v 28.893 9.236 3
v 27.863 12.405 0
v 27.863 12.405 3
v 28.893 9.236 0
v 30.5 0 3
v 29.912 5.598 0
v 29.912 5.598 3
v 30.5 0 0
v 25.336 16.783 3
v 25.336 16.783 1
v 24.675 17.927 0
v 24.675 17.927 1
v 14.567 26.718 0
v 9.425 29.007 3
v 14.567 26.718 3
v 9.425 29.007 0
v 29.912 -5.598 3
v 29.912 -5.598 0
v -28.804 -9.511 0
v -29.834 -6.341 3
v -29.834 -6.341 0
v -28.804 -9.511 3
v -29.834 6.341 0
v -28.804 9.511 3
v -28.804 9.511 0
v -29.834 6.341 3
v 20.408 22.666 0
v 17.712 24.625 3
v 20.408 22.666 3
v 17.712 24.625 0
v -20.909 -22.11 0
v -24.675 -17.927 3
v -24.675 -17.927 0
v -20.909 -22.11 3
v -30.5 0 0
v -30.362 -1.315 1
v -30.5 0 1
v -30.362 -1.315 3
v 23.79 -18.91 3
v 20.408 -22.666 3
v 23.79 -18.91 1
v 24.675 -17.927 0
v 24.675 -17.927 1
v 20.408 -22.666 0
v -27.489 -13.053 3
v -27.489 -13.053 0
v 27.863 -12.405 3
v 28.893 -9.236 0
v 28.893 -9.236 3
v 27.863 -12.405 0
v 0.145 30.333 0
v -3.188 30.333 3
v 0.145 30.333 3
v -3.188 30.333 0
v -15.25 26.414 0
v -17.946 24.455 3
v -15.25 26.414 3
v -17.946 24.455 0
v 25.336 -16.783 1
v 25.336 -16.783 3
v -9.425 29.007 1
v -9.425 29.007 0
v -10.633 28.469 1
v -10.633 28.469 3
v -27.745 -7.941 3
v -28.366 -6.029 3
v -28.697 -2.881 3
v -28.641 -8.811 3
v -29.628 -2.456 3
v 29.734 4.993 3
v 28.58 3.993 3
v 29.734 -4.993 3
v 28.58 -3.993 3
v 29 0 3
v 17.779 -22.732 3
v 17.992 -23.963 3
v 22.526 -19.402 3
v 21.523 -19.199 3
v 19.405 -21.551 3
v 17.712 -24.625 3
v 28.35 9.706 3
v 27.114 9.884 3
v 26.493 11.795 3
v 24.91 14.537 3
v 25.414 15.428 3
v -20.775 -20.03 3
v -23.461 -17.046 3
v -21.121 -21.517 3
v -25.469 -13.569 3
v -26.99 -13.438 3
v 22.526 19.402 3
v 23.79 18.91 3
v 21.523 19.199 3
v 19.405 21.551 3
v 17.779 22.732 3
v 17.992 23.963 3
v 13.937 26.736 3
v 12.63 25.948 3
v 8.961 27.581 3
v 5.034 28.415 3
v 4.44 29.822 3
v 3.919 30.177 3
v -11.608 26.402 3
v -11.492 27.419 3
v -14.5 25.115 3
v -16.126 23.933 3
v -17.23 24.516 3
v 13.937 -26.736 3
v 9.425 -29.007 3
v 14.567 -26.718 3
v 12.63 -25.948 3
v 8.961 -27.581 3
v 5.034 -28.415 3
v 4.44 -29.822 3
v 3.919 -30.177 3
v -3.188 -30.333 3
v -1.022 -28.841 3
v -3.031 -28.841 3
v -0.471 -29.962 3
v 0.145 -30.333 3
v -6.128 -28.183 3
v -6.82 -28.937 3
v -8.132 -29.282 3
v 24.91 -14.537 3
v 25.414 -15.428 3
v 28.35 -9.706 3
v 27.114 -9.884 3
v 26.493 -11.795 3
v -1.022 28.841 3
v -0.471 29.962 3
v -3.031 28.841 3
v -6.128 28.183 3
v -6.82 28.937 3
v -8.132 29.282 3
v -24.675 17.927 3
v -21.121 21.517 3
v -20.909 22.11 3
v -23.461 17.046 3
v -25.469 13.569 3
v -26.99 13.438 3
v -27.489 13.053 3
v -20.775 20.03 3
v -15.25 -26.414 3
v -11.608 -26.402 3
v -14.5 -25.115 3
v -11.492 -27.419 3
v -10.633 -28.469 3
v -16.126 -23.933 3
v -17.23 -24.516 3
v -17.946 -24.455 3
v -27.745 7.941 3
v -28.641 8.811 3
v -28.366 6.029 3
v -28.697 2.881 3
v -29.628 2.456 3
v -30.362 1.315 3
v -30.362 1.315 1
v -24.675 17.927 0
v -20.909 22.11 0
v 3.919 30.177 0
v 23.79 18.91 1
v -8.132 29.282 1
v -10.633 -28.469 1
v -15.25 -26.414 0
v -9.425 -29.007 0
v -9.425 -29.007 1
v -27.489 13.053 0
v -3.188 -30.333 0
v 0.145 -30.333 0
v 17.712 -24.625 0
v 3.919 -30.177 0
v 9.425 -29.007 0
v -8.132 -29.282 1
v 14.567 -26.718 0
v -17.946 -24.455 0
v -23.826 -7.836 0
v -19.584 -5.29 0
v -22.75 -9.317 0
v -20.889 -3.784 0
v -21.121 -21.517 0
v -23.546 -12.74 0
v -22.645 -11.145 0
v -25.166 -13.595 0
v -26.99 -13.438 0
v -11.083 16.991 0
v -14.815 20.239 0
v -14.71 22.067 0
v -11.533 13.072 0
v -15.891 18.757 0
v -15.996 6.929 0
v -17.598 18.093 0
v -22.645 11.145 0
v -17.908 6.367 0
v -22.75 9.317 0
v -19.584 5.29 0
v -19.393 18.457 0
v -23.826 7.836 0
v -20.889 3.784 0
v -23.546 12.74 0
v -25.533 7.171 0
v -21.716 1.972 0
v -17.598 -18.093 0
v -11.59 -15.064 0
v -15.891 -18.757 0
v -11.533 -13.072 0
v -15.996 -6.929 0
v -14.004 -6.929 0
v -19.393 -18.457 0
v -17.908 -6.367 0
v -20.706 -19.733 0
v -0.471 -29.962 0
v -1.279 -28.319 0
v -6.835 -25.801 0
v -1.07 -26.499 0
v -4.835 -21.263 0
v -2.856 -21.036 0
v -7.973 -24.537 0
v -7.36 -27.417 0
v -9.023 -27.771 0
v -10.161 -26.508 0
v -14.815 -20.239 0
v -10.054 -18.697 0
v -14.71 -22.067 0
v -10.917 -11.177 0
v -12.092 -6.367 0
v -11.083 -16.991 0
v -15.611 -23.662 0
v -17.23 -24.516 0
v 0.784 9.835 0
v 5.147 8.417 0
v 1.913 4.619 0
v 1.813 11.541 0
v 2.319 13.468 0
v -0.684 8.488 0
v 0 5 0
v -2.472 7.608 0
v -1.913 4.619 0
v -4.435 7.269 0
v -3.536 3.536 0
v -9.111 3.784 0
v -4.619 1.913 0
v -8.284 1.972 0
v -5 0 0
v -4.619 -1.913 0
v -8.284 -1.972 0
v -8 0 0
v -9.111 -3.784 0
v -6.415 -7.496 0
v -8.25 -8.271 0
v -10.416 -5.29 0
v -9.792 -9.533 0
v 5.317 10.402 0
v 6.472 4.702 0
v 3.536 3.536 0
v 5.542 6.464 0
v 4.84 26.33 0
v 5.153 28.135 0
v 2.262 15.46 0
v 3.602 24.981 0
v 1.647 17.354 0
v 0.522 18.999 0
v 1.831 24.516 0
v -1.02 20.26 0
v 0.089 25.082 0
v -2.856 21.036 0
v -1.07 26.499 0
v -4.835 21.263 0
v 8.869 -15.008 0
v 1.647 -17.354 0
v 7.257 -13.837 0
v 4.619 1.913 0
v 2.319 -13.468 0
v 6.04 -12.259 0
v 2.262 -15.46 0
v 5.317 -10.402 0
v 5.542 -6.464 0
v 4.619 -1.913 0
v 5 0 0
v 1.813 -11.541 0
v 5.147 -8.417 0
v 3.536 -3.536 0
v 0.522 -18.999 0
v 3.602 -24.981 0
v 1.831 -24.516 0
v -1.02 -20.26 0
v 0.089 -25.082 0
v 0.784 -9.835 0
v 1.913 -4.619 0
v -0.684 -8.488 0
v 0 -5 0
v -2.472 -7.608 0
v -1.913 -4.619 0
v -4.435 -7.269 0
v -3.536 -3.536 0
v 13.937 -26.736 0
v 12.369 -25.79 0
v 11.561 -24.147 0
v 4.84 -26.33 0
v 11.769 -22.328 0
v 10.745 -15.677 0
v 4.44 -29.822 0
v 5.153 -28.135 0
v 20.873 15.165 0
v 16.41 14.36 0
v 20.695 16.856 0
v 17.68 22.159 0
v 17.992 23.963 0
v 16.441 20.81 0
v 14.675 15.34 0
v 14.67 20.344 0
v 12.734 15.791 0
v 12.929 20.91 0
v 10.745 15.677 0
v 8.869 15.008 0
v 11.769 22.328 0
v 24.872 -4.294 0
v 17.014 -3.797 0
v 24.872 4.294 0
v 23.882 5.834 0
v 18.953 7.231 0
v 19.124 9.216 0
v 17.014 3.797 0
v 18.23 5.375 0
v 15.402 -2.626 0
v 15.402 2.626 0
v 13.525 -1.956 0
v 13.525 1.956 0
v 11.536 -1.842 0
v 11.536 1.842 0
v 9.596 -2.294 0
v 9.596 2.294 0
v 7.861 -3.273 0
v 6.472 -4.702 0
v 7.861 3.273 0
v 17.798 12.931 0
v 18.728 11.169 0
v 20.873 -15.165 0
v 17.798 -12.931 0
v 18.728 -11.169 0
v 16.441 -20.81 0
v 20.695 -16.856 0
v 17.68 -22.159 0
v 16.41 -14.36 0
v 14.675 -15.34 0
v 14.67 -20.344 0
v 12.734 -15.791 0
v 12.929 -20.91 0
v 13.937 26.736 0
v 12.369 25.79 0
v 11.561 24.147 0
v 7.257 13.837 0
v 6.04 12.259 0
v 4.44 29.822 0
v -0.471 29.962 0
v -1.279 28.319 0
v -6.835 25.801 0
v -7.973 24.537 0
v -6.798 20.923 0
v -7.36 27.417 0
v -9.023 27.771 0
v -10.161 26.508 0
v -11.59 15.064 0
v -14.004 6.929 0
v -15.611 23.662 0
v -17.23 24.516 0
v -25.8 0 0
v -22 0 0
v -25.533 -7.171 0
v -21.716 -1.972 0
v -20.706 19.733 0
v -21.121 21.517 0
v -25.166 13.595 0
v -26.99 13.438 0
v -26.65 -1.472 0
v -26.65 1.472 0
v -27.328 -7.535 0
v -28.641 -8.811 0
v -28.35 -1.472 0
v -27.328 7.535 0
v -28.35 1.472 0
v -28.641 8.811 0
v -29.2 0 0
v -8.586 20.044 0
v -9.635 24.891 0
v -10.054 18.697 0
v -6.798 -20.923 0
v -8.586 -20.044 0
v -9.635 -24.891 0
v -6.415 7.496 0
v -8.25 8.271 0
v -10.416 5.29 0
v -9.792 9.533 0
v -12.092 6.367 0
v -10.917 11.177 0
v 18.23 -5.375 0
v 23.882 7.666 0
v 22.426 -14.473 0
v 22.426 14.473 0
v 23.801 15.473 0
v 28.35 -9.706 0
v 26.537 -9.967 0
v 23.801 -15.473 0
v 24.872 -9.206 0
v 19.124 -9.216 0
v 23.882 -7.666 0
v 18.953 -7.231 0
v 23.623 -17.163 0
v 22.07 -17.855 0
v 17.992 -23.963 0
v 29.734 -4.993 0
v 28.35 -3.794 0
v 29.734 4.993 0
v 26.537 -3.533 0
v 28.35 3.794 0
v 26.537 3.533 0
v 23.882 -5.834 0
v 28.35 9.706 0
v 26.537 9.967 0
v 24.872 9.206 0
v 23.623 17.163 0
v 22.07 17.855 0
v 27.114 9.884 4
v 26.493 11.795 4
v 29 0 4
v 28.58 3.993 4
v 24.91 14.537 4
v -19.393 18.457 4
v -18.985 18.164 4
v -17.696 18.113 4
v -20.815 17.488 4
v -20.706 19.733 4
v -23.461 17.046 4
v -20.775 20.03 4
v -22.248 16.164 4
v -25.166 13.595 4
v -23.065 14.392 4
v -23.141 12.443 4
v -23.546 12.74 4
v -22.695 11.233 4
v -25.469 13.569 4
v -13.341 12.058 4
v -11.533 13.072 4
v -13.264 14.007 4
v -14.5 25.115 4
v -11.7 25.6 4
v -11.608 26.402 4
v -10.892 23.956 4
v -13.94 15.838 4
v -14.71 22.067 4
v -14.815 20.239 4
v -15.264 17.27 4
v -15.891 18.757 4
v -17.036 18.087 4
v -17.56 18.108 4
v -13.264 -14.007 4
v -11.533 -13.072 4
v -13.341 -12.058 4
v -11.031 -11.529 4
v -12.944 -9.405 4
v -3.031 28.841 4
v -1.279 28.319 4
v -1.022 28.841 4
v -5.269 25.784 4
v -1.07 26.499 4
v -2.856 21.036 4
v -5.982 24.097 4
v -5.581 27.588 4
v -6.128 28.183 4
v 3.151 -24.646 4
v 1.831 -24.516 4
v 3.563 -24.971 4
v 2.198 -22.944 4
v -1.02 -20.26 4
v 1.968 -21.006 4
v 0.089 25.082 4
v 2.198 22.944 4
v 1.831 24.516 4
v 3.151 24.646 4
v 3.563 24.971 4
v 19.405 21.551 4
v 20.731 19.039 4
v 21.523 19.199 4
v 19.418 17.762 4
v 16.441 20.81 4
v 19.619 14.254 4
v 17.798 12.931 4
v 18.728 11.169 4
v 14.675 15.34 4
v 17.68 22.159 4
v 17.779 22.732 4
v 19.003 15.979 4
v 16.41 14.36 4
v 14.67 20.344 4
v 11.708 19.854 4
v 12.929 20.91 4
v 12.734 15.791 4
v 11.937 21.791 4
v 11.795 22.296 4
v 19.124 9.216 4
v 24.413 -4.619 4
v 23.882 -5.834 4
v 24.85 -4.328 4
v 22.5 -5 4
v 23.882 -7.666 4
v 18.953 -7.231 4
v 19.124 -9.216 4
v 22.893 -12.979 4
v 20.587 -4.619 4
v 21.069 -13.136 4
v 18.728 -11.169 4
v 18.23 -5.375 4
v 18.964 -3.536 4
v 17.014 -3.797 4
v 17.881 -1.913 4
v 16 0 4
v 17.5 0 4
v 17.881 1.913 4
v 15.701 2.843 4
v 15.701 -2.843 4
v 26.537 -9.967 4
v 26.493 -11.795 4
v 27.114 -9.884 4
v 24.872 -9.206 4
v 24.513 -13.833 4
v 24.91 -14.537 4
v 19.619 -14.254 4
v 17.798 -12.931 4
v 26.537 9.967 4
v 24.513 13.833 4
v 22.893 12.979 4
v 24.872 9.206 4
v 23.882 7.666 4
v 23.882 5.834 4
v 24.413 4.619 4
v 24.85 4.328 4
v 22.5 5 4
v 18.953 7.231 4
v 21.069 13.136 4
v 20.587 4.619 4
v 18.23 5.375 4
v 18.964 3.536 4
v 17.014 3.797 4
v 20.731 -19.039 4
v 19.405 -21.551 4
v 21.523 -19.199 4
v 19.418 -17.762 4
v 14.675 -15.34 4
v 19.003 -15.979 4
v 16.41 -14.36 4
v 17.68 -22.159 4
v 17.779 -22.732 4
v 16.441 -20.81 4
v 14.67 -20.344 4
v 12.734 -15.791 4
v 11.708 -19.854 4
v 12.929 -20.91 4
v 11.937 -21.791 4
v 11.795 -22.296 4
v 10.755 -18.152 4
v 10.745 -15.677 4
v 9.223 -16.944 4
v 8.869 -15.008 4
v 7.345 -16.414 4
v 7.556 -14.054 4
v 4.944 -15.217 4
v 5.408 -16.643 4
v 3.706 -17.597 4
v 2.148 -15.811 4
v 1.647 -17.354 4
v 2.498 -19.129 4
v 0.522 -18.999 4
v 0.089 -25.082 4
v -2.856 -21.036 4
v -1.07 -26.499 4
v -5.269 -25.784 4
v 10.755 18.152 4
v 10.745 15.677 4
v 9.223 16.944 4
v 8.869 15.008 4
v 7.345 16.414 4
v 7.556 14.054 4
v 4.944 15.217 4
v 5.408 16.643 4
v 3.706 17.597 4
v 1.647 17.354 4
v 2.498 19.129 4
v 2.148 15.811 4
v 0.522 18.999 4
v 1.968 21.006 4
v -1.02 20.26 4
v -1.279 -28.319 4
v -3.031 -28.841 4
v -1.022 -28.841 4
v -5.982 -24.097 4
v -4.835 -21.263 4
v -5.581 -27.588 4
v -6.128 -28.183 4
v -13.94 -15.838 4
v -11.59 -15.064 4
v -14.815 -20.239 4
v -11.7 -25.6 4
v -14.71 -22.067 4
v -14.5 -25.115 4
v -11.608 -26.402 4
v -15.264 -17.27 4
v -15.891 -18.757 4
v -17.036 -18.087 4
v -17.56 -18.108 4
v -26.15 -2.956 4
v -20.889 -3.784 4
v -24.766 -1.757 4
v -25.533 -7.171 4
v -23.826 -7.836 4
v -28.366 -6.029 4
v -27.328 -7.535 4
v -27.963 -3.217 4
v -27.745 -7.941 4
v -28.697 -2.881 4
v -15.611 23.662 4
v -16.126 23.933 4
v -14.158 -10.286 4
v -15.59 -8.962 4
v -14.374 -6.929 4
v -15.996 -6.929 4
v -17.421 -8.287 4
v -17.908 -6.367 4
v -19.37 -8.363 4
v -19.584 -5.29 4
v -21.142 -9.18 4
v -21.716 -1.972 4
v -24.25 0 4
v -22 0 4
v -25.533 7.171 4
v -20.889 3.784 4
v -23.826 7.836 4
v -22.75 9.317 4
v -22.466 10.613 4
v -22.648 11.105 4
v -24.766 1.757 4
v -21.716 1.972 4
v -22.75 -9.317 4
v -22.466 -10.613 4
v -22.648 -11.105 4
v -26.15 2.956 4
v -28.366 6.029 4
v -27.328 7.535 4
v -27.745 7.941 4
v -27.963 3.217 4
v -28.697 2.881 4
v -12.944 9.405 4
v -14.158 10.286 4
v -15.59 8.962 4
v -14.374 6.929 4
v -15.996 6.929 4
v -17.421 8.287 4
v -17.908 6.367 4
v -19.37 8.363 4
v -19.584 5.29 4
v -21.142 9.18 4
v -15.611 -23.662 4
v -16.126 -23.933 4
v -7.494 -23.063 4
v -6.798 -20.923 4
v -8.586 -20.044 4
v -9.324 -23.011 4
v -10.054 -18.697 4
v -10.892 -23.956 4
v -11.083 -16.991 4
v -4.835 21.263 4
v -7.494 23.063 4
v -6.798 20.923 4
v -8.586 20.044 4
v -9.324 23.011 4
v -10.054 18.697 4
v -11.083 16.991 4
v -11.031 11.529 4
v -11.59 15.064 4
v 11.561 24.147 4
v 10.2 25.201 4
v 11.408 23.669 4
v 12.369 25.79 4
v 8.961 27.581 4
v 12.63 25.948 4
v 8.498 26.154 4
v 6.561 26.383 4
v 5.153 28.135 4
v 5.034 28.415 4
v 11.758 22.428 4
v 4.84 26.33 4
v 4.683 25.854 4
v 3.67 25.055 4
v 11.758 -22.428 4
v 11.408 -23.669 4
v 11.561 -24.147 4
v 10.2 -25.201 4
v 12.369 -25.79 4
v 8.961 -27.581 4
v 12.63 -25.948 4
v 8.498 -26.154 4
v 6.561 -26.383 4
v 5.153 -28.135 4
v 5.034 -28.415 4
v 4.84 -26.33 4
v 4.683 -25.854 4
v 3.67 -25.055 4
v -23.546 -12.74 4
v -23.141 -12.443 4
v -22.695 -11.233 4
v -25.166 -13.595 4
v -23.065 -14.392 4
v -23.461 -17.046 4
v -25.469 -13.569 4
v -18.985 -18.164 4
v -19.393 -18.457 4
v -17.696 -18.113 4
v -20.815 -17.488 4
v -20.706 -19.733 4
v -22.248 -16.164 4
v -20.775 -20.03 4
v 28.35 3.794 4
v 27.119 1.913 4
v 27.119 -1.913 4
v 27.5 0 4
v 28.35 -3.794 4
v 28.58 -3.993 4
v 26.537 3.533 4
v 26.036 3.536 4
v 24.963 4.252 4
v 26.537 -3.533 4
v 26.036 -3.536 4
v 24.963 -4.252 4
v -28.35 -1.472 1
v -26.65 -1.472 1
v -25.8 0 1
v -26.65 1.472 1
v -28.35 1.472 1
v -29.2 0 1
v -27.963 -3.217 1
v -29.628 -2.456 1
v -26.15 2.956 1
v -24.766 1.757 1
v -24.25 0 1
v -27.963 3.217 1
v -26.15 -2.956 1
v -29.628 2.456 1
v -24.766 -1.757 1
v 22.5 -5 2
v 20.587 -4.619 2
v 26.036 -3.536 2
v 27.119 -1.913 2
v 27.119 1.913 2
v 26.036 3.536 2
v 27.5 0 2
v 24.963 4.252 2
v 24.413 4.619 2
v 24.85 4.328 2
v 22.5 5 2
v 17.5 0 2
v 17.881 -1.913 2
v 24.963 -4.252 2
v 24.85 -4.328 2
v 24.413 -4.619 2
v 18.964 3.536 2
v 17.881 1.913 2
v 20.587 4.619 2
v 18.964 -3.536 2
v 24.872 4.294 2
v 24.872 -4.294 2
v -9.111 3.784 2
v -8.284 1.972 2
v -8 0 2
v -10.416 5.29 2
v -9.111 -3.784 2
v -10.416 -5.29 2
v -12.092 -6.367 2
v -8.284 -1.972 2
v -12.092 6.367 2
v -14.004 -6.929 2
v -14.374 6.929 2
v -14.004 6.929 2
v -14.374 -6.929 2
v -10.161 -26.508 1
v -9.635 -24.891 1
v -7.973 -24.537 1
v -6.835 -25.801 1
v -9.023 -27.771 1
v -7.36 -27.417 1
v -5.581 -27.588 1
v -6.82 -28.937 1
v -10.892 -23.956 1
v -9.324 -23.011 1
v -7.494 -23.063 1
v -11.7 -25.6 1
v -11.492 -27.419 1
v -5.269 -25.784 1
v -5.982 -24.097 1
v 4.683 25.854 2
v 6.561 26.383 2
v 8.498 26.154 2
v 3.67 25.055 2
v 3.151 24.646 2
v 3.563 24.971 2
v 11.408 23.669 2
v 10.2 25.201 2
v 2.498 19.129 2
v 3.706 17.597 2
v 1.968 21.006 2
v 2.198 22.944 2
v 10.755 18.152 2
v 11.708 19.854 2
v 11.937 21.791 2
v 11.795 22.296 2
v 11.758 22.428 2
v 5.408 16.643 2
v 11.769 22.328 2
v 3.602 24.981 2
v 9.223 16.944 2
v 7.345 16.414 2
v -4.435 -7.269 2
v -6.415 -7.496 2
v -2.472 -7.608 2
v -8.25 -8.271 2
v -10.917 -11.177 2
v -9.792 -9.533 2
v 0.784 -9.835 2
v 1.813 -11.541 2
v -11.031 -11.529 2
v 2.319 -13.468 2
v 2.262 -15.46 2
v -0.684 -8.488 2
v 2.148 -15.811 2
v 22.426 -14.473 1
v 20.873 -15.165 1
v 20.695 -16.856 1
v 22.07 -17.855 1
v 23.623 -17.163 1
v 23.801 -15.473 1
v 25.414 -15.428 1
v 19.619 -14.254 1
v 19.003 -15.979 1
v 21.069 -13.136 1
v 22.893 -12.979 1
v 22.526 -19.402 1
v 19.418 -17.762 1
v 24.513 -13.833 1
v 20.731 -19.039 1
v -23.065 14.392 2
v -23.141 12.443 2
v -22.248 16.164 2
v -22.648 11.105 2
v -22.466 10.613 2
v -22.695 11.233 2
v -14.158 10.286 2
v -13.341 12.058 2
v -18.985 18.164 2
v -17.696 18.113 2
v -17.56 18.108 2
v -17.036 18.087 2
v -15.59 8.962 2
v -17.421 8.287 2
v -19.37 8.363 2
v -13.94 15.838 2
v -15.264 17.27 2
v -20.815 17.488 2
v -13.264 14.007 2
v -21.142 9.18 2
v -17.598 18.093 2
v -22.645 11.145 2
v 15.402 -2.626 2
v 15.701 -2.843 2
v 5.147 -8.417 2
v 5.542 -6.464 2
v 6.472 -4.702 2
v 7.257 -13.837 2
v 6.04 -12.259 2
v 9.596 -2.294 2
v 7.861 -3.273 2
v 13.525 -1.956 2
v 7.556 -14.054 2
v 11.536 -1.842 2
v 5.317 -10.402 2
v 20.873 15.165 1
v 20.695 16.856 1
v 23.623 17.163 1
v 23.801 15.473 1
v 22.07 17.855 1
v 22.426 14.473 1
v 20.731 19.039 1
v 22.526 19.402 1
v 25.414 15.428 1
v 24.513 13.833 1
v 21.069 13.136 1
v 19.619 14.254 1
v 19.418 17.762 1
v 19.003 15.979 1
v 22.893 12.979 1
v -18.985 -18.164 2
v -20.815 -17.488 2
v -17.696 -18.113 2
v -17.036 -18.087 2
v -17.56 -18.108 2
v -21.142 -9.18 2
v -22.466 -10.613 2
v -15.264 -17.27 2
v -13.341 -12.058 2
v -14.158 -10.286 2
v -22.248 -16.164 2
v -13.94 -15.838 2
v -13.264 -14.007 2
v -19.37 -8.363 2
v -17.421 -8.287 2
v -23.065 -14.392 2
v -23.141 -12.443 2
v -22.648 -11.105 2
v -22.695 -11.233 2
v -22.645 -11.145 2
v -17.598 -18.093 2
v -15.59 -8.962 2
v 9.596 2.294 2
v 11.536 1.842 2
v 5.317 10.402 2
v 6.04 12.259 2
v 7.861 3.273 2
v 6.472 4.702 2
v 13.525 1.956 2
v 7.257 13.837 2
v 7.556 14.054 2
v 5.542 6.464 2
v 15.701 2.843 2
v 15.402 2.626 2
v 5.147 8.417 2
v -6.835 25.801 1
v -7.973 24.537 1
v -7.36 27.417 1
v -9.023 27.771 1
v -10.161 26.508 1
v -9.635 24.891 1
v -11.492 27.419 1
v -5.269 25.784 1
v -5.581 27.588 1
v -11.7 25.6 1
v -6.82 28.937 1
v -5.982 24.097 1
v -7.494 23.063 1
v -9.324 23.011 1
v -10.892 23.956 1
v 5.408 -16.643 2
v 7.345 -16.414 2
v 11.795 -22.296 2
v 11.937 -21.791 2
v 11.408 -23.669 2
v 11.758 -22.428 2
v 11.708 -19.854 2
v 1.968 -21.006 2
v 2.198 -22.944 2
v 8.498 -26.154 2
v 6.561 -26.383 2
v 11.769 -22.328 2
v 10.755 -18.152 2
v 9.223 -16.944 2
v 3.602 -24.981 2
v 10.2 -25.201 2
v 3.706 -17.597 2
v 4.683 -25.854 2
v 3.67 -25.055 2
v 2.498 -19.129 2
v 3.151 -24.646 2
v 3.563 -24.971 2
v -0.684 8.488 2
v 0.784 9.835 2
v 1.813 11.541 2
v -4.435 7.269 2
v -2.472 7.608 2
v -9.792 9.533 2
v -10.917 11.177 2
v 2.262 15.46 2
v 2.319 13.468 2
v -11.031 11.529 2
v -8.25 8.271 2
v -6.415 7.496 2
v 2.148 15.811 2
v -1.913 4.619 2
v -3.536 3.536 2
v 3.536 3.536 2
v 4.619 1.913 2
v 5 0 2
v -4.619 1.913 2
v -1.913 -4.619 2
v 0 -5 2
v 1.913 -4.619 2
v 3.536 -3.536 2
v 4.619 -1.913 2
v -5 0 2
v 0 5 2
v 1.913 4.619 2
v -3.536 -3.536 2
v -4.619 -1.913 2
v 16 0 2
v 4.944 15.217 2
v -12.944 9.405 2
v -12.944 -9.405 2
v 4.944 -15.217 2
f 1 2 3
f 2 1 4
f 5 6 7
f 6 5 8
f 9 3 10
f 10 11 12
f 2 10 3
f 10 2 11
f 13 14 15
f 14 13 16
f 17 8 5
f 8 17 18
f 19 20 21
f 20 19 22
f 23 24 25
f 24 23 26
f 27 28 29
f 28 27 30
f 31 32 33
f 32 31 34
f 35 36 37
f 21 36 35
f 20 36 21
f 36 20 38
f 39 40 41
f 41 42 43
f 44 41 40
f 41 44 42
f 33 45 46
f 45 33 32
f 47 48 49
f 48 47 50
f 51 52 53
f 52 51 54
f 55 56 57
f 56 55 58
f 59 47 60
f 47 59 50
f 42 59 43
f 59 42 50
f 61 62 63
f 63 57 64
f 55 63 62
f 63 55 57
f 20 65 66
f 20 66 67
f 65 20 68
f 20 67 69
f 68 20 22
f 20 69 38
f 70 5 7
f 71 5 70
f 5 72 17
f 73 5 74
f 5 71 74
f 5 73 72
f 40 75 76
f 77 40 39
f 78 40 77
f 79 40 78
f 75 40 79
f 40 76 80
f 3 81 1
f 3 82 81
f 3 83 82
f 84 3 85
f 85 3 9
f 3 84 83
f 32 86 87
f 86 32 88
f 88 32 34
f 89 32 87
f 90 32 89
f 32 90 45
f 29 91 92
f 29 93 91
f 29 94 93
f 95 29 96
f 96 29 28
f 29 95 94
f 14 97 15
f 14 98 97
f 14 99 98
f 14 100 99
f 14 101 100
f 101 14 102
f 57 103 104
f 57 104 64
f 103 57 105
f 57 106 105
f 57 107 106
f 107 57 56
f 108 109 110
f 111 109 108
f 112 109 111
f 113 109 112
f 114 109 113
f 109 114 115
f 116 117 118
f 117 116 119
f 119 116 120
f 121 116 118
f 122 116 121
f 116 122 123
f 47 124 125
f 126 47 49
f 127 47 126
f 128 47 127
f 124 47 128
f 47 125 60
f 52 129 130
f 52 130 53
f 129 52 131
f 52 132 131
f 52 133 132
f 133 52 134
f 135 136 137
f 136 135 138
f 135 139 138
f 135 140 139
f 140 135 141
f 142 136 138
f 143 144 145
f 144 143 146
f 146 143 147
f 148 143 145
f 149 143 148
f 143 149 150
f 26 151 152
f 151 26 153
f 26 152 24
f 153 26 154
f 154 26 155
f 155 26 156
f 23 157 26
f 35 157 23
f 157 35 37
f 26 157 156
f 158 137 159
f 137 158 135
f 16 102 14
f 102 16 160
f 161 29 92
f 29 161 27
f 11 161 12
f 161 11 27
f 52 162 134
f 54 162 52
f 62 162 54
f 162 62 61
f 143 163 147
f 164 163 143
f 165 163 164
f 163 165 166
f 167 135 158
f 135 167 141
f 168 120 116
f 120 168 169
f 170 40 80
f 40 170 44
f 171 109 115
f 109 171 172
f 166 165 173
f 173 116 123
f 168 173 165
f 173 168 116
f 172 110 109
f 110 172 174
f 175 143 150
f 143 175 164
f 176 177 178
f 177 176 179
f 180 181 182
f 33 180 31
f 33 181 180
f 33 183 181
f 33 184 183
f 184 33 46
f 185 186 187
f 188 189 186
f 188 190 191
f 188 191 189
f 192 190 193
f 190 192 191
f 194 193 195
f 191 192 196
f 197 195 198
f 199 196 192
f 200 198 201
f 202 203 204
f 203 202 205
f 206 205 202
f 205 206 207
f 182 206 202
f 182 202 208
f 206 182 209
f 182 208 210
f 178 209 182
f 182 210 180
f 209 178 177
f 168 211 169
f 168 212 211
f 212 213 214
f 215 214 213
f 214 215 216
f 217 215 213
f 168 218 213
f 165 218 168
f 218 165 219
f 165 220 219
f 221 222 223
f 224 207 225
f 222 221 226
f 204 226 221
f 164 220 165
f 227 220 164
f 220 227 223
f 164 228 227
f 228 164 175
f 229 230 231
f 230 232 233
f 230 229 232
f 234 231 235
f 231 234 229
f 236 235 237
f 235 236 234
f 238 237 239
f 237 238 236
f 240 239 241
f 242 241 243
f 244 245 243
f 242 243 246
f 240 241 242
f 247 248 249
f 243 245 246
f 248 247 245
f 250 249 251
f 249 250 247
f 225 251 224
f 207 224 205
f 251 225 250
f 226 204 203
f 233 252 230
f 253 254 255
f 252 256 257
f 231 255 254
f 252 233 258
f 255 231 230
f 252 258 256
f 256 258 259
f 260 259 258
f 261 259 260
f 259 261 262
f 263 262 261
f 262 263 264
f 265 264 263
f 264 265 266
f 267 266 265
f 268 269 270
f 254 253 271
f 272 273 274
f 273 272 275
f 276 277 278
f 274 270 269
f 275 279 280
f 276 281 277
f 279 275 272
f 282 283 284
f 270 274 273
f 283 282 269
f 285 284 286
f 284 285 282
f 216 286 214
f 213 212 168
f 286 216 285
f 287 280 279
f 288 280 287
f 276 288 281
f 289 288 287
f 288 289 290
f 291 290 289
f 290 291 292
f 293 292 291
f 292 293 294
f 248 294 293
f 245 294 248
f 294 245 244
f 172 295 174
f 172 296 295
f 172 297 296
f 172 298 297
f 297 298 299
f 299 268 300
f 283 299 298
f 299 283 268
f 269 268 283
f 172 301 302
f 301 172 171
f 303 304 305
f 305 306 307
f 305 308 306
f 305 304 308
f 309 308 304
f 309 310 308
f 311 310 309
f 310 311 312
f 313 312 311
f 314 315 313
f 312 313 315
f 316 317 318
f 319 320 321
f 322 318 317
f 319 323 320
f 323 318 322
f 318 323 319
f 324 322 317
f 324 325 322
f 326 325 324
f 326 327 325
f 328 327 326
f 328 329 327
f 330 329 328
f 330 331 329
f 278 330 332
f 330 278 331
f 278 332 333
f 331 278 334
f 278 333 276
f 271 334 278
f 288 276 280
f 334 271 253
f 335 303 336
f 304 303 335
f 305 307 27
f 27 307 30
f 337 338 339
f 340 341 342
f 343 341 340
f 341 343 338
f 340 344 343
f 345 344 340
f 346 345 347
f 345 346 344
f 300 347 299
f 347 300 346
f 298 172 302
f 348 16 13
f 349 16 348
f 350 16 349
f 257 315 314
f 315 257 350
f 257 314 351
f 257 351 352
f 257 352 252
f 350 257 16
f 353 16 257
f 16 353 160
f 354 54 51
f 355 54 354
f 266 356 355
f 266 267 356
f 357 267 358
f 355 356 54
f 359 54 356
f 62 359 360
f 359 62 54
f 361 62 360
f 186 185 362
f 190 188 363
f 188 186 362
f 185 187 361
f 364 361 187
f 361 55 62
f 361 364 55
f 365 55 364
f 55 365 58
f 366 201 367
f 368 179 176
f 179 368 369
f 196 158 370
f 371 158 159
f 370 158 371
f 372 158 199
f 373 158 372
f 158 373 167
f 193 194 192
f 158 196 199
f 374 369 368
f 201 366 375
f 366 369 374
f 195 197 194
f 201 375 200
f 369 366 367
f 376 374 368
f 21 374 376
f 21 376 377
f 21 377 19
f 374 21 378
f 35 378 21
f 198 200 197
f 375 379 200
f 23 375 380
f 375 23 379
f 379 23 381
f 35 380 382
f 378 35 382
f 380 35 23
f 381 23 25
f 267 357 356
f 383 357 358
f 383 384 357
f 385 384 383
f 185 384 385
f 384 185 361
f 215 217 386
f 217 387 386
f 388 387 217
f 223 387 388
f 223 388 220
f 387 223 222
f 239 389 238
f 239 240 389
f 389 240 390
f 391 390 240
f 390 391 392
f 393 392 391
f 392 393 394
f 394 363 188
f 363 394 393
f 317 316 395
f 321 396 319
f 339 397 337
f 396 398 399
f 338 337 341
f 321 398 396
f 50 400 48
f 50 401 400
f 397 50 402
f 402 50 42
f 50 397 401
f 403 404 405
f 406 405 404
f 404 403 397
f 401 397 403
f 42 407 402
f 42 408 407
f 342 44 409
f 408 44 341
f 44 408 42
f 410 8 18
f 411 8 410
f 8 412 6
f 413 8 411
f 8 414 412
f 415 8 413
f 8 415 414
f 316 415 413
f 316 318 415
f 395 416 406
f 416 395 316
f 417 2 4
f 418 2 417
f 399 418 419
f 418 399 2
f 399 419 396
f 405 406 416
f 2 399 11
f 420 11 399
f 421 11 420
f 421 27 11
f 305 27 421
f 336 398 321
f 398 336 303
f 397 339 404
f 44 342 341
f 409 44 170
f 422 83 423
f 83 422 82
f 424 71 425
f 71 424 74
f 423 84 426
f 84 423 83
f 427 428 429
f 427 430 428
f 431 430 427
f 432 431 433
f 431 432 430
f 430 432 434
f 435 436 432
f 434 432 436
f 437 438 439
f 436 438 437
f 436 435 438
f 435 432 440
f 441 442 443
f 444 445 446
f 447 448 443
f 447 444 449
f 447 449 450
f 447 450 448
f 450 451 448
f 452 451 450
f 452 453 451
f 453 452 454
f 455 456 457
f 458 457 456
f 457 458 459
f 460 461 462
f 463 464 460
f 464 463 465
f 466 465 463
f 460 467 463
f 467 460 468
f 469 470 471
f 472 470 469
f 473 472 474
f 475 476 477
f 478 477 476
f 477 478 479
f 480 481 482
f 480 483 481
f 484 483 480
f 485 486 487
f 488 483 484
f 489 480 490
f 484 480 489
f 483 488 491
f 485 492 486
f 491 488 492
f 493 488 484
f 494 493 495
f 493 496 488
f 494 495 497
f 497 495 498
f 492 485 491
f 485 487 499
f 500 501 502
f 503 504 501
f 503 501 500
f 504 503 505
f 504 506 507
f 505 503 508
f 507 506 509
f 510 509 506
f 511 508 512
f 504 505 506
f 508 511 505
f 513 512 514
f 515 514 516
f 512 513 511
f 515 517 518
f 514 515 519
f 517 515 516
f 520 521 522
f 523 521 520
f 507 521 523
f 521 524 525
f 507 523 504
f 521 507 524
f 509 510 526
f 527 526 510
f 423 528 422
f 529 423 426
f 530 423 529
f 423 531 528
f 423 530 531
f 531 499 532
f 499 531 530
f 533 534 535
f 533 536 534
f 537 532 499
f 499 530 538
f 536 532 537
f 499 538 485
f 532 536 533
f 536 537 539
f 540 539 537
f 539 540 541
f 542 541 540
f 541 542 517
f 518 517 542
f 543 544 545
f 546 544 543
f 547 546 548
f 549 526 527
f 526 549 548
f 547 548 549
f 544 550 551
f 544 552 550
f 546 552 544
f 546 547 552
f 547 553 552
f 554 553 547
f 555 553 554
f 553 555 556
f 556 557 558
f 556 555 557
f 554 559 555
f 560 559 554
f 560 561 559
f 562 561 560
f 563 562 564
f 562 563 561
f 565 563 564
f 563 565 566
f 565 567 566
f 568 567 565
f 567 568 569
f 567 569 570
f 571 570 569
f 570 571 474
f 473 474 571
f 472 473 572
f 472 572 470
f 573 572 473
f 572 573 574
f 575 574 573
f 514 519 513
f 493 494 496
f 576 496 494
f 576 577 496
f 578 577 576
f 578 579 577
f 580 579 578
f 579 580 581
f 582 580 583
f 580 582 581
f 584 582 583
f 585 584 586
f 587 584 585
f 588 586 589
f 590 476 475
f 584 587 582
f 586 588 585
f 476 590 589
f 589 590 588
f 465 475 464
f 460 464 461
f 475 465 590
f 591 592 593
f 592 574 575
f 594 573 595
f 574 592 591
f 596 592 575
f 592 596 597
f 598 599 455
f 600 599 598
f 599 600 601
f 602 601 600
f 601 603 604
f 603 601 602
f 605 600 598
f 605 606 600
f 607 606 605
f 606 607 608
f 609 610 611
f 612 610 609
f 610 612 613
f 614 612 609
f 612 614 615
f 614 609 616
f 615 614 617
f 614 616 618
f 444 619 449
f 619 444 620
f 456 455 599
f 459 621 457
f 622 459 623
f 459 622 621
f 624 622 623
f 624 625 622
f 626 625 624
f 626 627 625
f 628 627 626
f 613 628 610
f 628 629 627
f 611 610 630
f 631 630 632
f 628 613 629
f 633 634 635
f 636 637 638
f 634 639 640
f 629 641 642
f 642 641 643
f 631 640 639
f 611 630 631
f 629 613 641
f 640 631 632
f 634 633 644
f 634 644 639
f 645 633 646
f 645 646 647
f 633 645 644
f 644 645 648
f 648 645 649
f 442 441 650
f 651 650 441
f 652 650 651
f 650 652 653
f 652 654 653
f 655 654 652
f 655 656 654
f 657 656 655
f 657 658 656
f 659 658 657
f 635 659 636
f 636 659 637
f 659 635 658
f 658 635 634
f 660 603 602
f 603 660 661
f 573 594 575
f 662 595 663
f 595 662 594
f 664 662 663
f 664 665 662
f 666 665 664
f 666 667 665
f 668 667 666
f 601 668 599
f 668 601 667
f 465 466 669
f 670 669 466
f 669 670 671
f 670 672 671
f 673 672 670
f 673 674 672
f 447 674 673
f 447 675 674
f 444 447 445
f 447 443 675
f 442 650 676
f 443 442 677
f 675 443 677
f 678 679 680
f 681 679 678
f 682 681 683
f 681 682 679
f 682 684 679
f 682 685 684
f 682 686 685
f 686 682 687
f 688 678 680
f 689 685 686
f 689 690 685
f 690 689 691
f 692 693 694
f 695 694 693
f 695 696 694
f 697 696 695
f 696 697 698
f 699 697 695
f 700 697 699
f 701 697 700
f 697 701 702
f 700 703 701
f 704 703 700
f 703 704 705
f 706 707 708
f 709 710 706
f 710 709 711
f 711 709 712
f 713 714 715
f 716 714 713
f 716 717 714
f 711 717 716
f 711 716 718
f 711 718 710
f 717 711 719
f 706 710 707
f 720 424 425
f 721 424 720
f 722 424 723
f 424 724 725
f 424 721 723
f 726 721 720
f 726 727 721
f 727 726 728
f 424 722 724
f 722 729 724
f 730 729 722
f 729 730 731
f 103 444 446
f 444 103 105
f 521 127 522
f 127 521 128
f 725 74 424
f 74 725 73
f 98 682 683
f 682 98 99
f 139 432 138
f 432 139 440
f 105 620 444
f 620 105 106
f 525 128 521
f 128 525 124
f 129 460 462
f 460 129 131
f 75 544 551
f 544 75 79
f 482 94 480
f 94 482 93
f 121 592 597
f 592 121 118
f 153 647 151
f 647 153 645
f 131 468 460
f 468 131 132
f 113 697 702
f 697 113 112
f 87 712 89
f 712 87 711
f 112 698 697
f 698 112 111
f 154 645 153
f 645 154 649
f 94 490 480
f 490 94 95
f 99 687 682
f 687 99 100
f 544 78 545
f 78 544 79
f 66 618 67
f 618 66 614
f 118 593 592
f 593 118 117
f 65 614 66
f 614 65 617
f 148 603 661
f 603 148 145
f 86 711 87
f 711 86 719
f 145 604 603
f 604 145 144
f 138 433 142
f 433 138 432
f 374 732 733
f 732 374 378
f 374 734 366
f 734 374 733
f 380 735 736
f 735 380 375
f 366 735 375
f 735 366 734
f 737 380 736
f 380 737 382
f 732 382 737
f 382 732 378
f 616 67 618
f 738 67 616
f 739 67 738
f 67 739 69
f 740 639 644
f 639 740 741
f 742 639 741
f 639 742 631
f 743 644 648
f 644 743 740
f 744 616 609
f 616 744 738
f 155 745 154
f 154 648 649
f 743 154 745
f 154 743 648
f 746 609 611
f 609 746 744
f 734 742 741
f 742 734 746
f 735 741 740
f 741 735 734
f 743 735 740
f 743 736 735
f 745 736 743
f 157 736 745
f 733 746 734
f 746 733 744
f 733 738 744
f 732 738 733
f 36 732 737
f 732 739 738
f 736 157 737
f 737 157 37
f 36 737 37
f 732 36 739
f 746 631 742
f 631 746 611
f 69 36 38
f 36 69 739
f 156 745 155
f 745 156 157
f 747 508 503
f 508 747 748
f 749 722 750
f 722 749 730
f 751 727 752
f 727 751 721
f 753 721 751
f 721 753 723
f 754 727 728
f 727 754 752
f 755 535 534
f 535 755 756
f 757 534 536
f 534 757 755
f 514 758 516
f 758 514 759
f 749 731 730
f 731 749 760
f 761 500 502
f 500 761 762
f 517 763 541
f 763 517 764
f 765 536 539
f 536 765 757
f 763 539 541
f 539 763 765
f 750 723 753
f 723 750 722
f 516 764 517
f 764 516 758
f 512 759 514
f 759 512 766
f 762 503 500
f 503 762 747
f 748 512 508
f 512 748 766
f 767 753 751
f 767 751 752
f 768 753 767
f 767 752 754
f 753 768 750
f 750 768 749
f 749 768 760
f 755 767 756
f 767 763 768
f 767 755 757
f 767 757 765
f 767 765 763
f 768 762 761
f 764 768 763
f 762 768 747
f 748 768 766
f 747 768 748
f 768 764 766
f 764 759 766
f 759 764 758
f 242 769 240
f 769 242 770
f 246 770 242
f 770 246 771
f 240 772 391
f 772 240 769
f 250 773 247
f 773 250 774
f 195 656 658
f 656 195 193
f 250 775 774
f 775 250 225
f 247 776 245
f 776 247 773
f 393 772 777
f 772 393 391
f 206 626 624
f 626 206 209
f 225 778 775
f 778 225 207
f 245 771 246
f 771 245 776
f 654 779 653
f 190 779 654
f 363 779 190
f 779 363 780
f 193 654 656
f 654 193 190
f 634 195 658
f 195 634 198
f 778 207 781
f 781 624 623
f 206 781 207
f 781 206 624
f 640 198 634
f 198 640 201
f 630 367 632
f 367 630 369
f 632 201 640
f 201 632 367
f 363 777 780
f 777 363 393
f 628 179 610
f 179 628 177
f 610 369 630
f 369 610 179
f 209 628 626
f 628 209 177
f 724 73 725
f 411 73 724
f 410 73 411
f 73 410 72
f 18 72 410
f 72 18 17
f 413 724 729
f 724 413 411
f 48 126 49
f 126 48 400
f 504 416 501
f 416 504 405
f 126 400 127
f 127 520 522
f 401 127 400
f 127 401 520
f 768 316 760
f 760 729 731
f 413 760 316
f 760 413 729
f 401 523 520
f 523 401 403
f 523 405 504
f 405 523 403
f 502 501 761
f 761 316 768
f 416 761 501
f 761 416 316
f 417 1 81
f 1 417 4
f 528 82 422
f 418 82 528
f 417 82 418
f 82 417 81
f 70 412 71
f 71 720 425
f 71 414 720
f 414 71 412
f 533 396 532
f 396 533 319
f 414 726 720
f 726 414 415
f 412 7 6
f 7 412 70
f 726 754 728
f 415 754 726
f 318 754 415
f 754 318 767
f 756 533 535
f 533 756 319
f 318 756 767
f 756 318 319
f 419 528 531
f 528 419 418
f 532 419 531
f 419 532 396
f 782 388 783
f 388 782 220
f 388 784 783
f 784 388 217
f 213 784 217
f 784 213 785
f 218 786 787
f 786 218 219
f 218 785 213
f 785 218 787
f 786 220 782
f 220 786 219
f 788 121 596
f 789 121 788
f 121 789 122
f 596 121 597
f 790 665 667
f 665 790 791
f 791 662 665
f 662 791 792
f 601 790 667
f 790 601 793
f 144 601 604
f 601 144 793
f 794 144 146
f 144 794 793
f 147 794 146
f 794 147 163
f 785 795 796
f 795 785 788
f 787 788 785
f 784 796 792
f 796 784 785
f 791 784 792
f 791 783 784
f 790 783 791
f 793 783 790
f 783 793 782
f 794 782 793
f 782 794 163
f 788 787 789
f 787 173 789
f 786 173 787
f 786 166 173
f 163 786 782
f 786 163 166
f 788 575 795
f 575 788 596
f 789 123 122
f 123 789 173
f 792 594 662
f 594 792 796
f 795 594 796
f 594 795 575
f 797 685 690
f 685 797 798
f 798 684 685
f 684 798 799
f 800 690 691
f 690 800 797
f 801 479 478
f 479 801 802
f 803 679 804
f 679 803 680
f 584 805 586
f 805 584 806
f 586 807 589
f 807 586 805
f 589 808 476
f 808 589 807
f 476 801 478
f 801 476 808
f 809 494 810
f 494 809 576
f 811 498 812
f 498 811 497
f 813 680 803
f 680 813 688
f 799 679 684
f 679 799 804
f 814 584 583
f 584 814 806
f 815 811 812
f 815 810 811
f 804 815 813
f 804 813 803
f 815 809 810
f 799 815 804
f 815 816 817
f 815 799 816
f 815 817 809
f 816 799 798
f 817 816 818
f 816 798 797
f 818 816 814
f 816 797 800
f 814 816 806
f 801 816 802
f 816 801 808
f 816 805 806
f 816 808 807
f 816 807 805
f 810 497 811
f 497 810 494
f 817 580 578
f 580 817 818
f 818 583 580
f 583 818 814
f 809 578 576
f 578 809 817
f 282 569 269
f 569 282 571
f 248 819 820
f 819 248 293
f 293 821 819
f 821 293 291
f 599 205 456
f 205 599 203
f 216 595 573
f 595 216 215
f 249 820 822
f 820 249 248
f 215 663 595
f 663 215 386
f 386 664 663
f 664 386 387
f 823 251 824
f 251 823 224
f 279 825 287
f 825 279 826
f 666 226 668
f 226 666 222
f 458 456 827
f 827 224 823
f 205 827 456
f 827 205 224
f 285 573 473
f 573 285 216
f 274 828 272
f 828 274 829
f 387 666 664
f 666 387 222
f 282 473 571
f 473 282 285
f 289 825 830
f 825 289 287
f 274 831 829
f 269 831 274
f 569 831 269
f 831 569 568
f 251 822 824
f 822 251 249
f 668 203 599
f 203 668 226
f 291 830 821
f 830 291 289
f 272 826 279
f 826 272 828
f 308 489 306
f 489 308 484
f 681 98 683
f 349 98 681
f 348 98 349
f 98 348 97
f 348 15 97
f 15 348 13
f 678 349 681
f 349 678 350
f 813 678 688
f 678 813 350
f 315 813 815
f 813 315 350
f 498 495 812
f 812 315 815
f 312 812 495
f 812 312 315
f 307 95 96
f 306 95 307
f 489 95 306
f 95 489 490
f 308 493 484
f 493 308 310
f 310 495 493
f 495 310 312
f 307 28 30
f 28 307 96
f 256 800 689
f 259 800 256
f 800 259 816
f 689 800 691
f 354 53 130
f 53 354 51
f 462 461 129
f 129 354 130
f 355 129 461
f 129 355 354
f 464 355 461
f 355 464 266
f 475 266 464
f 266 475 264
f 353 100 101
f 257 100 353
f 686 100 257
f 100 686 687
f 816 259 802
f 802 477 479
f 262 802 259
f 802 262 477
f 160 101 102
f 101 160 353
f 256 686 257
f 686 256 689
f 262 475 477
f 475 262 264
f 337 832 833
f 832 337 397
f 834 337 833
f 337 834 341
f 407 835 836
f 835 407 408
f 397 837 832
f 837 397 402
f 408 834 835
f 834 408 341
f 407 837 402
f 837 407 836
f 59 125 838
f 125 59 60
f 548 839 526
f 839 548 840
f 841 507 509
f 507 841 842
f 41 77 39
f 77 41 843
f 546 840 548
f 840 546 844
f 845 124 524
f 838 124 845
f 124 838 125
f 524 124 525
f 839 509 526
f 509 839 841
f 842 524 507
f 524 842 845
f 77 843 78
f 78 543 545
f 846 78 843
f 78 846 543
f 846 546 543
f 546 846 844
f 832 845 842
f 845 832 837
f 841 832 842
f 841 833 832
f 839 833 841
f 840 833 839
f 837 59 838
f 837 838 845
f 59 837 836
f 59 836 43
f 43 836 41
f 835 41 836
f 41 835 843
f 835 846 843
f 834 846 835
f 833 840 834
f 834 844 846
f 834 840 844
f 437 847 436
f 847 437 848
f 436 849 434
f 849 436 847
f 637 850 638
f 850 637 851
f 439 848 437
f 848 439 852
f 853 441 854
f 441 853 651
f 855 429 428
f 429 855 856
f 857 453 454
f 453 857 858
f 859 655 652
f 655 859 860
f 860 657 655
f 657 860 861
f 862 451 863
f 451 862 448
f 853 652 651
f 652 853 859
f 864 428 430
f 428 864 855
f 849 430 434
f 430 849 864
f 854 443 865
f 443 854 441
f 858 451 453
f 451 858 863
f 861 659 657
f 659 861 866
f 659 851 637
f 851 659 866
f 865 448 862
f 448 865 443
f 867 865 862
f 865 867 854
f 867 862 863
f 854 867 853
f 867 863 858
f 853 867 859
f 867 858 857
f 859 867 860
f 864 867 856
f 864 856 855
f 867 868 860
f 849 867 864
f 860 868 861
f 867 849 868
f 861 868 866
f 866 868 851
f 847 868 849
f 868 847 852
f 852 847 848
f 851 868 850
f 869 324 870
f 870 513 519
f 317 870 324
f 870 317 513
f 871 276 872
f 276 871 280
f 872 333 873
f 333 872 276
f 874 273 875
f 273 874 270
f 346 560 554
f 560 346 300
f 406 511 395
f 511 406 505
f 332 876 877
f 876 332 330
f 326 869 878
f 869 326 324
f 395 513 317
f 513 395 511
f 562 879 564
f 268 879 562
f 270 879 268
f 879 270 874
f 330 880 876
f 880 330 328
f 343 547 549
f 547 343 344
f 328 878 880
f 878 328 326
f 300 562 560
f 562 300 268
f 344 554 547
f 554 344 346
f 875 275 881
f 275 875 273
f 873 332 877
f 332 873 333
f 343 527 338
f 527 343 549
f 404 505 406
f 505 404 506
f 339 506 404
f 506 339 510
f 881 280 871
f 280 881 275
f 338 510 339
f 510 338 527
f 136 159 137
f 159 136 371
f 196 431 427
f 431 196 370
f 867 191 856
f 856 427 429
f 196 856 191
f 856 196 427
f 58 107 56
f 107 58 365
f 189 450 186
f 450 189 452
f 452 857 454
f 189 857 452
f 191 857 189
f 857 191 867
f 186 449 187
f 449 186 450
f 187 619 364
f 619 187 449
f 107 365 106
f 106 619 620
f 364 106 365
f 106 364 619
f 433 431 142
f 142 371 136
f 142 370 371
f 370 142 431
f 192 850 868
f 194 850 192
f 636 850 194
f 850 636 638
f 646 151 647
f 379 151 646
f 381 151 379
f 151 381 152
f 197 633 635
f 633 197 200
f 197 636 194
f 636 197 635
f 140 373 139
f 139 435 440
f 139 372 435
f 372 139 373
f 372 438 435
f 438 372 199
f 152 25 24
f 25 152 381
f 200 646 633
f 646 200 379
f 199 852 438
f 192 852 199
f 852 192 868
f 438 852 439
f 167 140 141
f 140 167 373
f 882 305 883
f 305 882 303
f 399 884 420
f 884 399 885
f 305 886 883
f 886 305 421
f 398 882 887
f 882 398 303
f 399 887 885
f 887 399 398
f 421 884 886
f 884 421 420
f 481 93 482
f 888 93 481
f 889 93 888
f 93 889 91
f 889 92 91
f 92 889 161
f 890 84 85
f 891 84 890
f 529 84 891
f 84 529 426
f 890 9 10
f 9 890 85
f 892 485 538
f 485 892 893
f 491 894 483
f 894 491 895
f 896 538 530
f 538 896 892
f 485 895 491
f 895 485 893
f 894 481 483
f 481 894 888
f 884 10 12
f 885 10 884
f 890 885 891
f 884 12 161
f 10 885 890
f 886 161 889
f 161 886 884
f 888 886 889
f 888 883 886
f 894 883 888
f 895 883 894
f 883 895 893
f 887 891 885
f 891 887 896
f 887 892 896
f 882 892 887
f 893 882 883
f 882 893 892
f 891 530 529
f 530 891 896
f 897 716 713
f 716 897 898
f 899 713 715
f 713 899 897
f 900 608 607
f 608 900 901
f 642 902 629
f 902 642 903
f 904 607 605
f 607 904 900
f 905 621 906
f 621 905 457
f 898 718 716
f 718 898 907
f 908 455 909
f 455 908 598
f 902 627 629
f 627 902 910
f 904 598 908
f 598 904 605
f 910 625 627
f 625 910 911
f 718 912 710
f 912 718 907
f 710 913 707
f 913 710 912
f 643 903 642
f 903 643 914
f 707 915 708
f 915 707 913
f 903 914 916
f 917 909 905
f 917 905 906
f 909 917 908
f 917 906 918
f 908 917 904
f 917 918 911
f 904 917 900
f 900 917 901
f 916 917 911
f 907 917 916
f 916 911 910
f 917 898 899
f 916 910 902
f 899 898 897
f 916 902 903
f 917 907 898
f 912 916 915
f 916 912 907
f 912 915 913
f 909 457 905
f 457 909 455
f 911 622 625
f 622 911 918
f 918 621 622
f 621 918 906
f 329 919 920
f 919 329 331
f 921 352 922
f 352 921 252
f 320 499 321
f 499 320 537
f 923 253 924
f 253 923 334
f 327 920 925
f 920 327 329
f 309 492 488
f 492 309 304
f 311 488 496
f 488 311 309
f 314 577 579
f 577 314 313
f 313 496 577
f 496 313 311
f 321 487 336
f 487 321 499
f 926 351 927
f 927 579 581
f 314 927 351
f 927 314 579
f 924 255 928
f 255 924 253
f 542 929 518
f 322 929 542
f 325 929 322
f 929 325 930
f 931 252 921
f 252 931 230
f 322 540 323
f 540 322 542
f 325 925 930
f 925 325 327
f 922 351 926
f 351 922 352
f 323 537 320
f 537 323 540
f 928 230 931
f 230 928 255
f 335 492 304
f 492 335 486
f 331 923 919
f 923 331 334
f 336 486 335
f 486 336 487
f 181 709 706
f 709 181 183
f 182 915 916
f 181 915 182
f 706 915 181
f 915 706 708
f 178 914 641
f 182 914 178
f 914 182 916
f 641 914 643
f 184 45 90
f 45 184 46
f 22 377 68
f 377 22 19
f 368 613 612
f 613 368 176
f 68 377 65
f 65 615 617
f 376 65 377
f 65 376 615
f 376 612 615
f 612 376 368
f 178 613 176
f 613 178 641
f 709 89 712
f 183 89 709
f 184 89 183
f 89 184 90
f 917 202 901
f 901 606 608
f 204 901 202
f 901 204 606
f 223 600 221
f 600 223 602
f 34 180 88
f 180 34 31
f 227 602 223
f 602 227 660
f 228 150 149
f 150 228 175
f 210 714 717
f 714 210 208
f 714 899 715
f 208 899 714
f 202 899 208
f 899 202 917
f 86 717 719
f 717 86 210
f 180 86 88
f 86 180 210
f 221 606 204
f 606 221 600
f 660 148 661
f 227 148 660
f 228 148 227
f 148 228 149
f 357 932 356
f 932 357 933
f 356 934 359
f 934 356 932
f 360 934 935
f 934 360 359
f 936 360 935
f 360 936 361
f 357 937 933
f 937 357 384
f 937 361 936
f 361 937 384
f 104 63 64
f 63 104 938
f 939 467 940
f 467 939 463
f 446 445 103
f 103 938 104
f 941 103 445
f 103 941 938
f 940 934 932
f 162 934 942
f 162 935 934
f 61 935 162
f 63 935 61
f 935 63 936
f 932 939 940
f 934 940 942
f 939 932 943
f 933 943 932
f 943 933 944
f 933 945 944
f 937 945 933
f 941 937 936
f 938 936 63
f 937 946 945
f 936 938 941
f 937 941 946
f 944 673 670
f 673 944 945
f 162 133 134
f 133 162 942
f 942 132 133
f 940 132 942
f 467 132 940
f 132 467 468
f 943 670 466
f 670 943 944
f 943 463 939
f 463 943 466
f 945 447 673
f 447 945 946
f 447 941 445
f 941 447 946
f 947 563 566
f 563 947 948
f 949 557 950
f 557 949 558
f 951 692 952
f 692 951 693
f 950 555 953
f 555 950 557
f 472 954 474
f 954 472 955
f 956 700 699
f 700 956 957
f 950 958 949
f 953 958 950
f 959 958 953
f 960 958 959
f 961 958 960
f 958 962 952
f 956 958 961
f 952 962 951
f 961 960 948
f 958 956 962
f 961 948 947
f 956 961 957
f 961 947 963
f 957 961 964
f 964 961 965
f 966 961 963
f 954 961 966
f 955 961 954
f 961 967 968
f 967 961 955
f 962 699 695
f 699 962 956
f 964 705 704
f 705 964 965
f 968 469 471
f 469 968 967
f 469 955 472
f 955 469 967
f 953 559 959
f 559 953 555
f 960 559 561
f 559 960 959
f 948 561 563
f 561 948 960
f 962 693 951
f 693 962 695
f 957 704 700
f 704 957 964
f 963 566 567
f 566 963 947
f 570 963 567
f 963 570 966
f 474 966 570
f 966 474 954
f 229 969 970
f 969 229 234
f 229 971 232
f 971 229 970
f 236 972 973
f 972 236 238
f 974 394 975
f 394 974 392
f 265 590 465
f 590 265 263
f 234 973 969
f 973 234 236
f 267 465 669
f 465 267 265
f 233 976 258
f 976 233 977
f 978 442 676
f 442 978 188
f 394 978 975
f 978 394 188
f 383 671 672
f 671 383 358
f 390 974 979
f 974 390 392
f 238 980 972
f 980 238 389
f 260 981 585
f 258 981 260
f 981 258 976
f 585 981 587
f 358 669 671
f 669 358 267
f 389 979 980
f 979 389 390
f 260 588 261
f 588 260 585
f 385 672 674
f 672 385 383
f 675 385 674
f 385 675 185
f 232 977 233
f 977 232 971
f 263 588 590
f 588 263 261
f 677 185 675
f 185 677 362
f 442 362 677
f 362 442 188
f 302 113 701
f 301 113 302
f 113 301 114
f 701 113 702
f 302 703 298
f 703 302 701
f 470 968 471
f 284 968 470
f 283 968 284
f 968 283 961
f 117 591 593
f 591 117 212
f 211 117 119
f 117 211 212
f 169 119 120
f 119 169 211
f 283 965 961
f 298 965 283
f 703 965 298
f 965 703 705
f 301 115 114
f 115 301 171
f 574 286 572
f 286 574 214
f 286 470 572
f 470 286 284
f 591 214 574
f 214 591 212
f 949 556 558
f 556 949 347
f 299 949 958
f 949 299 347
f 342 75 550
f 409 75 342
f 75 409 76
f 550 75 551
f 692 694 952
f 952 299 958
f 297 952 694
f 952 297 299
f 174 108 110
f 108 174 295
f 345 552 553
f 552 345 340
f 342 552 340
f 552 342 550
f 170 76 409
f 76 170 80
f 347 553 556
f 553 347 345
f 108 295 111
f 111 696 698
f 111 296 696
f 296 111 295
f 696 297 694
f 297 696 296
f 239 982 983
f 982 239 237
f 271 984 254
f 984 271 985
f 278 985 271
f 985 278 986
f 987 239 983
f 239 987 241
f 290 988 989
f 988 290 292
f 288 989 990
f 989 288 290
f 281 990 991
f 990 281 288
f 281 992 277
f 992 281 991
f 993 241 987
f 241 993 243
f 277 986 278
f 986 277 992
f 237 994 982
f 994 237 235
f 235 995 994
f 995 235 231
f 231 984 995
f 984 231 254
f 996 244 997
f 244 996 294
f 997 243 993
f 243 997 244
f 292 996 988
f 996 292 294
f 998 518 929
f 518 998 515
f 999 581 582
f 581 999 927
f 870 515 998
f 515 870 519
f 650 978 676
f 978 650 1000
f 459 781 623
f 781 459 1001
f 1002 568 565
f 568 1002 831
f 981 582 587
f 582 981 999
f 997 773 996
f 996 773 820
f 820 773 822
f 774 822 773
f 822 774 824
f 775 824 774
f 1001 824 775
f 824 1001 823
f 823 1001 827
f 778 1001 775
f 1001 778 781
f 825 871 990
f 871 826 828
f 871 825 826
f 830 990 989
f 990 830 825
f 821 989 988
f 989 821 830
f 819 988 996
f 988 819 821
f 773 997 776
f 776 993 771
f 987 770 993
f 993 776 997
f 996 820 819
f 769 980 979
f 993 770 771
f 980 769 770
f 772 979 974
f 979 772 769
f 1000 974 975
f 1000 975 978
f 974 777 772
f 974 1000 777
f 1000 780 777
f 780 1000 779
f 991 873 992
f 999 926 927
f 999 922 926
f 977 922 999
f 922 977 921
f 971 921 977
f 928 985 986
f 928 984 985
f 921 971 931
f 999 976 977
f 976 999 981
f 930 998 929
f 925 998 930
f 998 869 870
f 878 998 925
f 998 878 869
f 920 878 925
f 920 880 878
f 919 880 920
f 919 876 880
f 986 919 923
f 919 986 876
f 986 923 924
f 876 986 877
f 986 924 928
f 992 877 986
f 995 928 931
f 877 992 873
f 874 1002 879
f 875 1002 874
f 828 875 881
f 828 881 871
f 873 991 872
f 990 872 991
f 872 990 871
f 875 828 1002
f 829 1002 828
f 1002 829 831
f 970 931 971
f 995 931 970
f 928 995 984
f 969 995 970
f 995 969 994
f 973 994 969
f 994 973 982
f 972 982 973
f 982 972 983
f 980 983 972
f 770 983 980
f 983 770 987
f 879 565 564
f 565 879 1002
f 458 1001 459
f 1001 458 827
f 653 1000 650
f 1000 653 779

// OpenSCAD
//$fa = 6;
//$fs = 0.4;

base_plate();

module base_plate(){
    difference() {
        union () {
            // Main Shell
            cylinder(d=61, h=3);
            cylinder(d=58, h=4);
        }
        
        for (i=[0:4]) {
            // outer mounting holes
            rotate([0,0,i*72]) translate([-27.5,0,-1]) cylinder(h=10, d=3.4);
            rotate([0,0,i*72]) translate([-27.5,0,1]) cylinder(h=10, d=6.5);
            
            // foot pads
            rotate([0,0,i*72]) translate([22.5,0,2]) cylinder(h=10, d=10);
            
            // weight save holes
            rotate([0,0,i*72]) translate([-15,0,-1]) cylinder(h=10, d=14);
            
            // digispark mounts (x5)
            // M3 Mounting Holes
            rotate([0,0,i*72]) translate([27,-6.75,-1]) cylinder(d=6.5, h=30);
            rotate([0,0,i*72]) translate([27,6.75,-1]) cylinder(d=6.5, h=30);
        }
        
        // weight save holes
        translate([0,0,-1]) cylinder(h=10, d=10);
        translate([0,0,2]) cylinder(d=32, h=4);

    }
}
